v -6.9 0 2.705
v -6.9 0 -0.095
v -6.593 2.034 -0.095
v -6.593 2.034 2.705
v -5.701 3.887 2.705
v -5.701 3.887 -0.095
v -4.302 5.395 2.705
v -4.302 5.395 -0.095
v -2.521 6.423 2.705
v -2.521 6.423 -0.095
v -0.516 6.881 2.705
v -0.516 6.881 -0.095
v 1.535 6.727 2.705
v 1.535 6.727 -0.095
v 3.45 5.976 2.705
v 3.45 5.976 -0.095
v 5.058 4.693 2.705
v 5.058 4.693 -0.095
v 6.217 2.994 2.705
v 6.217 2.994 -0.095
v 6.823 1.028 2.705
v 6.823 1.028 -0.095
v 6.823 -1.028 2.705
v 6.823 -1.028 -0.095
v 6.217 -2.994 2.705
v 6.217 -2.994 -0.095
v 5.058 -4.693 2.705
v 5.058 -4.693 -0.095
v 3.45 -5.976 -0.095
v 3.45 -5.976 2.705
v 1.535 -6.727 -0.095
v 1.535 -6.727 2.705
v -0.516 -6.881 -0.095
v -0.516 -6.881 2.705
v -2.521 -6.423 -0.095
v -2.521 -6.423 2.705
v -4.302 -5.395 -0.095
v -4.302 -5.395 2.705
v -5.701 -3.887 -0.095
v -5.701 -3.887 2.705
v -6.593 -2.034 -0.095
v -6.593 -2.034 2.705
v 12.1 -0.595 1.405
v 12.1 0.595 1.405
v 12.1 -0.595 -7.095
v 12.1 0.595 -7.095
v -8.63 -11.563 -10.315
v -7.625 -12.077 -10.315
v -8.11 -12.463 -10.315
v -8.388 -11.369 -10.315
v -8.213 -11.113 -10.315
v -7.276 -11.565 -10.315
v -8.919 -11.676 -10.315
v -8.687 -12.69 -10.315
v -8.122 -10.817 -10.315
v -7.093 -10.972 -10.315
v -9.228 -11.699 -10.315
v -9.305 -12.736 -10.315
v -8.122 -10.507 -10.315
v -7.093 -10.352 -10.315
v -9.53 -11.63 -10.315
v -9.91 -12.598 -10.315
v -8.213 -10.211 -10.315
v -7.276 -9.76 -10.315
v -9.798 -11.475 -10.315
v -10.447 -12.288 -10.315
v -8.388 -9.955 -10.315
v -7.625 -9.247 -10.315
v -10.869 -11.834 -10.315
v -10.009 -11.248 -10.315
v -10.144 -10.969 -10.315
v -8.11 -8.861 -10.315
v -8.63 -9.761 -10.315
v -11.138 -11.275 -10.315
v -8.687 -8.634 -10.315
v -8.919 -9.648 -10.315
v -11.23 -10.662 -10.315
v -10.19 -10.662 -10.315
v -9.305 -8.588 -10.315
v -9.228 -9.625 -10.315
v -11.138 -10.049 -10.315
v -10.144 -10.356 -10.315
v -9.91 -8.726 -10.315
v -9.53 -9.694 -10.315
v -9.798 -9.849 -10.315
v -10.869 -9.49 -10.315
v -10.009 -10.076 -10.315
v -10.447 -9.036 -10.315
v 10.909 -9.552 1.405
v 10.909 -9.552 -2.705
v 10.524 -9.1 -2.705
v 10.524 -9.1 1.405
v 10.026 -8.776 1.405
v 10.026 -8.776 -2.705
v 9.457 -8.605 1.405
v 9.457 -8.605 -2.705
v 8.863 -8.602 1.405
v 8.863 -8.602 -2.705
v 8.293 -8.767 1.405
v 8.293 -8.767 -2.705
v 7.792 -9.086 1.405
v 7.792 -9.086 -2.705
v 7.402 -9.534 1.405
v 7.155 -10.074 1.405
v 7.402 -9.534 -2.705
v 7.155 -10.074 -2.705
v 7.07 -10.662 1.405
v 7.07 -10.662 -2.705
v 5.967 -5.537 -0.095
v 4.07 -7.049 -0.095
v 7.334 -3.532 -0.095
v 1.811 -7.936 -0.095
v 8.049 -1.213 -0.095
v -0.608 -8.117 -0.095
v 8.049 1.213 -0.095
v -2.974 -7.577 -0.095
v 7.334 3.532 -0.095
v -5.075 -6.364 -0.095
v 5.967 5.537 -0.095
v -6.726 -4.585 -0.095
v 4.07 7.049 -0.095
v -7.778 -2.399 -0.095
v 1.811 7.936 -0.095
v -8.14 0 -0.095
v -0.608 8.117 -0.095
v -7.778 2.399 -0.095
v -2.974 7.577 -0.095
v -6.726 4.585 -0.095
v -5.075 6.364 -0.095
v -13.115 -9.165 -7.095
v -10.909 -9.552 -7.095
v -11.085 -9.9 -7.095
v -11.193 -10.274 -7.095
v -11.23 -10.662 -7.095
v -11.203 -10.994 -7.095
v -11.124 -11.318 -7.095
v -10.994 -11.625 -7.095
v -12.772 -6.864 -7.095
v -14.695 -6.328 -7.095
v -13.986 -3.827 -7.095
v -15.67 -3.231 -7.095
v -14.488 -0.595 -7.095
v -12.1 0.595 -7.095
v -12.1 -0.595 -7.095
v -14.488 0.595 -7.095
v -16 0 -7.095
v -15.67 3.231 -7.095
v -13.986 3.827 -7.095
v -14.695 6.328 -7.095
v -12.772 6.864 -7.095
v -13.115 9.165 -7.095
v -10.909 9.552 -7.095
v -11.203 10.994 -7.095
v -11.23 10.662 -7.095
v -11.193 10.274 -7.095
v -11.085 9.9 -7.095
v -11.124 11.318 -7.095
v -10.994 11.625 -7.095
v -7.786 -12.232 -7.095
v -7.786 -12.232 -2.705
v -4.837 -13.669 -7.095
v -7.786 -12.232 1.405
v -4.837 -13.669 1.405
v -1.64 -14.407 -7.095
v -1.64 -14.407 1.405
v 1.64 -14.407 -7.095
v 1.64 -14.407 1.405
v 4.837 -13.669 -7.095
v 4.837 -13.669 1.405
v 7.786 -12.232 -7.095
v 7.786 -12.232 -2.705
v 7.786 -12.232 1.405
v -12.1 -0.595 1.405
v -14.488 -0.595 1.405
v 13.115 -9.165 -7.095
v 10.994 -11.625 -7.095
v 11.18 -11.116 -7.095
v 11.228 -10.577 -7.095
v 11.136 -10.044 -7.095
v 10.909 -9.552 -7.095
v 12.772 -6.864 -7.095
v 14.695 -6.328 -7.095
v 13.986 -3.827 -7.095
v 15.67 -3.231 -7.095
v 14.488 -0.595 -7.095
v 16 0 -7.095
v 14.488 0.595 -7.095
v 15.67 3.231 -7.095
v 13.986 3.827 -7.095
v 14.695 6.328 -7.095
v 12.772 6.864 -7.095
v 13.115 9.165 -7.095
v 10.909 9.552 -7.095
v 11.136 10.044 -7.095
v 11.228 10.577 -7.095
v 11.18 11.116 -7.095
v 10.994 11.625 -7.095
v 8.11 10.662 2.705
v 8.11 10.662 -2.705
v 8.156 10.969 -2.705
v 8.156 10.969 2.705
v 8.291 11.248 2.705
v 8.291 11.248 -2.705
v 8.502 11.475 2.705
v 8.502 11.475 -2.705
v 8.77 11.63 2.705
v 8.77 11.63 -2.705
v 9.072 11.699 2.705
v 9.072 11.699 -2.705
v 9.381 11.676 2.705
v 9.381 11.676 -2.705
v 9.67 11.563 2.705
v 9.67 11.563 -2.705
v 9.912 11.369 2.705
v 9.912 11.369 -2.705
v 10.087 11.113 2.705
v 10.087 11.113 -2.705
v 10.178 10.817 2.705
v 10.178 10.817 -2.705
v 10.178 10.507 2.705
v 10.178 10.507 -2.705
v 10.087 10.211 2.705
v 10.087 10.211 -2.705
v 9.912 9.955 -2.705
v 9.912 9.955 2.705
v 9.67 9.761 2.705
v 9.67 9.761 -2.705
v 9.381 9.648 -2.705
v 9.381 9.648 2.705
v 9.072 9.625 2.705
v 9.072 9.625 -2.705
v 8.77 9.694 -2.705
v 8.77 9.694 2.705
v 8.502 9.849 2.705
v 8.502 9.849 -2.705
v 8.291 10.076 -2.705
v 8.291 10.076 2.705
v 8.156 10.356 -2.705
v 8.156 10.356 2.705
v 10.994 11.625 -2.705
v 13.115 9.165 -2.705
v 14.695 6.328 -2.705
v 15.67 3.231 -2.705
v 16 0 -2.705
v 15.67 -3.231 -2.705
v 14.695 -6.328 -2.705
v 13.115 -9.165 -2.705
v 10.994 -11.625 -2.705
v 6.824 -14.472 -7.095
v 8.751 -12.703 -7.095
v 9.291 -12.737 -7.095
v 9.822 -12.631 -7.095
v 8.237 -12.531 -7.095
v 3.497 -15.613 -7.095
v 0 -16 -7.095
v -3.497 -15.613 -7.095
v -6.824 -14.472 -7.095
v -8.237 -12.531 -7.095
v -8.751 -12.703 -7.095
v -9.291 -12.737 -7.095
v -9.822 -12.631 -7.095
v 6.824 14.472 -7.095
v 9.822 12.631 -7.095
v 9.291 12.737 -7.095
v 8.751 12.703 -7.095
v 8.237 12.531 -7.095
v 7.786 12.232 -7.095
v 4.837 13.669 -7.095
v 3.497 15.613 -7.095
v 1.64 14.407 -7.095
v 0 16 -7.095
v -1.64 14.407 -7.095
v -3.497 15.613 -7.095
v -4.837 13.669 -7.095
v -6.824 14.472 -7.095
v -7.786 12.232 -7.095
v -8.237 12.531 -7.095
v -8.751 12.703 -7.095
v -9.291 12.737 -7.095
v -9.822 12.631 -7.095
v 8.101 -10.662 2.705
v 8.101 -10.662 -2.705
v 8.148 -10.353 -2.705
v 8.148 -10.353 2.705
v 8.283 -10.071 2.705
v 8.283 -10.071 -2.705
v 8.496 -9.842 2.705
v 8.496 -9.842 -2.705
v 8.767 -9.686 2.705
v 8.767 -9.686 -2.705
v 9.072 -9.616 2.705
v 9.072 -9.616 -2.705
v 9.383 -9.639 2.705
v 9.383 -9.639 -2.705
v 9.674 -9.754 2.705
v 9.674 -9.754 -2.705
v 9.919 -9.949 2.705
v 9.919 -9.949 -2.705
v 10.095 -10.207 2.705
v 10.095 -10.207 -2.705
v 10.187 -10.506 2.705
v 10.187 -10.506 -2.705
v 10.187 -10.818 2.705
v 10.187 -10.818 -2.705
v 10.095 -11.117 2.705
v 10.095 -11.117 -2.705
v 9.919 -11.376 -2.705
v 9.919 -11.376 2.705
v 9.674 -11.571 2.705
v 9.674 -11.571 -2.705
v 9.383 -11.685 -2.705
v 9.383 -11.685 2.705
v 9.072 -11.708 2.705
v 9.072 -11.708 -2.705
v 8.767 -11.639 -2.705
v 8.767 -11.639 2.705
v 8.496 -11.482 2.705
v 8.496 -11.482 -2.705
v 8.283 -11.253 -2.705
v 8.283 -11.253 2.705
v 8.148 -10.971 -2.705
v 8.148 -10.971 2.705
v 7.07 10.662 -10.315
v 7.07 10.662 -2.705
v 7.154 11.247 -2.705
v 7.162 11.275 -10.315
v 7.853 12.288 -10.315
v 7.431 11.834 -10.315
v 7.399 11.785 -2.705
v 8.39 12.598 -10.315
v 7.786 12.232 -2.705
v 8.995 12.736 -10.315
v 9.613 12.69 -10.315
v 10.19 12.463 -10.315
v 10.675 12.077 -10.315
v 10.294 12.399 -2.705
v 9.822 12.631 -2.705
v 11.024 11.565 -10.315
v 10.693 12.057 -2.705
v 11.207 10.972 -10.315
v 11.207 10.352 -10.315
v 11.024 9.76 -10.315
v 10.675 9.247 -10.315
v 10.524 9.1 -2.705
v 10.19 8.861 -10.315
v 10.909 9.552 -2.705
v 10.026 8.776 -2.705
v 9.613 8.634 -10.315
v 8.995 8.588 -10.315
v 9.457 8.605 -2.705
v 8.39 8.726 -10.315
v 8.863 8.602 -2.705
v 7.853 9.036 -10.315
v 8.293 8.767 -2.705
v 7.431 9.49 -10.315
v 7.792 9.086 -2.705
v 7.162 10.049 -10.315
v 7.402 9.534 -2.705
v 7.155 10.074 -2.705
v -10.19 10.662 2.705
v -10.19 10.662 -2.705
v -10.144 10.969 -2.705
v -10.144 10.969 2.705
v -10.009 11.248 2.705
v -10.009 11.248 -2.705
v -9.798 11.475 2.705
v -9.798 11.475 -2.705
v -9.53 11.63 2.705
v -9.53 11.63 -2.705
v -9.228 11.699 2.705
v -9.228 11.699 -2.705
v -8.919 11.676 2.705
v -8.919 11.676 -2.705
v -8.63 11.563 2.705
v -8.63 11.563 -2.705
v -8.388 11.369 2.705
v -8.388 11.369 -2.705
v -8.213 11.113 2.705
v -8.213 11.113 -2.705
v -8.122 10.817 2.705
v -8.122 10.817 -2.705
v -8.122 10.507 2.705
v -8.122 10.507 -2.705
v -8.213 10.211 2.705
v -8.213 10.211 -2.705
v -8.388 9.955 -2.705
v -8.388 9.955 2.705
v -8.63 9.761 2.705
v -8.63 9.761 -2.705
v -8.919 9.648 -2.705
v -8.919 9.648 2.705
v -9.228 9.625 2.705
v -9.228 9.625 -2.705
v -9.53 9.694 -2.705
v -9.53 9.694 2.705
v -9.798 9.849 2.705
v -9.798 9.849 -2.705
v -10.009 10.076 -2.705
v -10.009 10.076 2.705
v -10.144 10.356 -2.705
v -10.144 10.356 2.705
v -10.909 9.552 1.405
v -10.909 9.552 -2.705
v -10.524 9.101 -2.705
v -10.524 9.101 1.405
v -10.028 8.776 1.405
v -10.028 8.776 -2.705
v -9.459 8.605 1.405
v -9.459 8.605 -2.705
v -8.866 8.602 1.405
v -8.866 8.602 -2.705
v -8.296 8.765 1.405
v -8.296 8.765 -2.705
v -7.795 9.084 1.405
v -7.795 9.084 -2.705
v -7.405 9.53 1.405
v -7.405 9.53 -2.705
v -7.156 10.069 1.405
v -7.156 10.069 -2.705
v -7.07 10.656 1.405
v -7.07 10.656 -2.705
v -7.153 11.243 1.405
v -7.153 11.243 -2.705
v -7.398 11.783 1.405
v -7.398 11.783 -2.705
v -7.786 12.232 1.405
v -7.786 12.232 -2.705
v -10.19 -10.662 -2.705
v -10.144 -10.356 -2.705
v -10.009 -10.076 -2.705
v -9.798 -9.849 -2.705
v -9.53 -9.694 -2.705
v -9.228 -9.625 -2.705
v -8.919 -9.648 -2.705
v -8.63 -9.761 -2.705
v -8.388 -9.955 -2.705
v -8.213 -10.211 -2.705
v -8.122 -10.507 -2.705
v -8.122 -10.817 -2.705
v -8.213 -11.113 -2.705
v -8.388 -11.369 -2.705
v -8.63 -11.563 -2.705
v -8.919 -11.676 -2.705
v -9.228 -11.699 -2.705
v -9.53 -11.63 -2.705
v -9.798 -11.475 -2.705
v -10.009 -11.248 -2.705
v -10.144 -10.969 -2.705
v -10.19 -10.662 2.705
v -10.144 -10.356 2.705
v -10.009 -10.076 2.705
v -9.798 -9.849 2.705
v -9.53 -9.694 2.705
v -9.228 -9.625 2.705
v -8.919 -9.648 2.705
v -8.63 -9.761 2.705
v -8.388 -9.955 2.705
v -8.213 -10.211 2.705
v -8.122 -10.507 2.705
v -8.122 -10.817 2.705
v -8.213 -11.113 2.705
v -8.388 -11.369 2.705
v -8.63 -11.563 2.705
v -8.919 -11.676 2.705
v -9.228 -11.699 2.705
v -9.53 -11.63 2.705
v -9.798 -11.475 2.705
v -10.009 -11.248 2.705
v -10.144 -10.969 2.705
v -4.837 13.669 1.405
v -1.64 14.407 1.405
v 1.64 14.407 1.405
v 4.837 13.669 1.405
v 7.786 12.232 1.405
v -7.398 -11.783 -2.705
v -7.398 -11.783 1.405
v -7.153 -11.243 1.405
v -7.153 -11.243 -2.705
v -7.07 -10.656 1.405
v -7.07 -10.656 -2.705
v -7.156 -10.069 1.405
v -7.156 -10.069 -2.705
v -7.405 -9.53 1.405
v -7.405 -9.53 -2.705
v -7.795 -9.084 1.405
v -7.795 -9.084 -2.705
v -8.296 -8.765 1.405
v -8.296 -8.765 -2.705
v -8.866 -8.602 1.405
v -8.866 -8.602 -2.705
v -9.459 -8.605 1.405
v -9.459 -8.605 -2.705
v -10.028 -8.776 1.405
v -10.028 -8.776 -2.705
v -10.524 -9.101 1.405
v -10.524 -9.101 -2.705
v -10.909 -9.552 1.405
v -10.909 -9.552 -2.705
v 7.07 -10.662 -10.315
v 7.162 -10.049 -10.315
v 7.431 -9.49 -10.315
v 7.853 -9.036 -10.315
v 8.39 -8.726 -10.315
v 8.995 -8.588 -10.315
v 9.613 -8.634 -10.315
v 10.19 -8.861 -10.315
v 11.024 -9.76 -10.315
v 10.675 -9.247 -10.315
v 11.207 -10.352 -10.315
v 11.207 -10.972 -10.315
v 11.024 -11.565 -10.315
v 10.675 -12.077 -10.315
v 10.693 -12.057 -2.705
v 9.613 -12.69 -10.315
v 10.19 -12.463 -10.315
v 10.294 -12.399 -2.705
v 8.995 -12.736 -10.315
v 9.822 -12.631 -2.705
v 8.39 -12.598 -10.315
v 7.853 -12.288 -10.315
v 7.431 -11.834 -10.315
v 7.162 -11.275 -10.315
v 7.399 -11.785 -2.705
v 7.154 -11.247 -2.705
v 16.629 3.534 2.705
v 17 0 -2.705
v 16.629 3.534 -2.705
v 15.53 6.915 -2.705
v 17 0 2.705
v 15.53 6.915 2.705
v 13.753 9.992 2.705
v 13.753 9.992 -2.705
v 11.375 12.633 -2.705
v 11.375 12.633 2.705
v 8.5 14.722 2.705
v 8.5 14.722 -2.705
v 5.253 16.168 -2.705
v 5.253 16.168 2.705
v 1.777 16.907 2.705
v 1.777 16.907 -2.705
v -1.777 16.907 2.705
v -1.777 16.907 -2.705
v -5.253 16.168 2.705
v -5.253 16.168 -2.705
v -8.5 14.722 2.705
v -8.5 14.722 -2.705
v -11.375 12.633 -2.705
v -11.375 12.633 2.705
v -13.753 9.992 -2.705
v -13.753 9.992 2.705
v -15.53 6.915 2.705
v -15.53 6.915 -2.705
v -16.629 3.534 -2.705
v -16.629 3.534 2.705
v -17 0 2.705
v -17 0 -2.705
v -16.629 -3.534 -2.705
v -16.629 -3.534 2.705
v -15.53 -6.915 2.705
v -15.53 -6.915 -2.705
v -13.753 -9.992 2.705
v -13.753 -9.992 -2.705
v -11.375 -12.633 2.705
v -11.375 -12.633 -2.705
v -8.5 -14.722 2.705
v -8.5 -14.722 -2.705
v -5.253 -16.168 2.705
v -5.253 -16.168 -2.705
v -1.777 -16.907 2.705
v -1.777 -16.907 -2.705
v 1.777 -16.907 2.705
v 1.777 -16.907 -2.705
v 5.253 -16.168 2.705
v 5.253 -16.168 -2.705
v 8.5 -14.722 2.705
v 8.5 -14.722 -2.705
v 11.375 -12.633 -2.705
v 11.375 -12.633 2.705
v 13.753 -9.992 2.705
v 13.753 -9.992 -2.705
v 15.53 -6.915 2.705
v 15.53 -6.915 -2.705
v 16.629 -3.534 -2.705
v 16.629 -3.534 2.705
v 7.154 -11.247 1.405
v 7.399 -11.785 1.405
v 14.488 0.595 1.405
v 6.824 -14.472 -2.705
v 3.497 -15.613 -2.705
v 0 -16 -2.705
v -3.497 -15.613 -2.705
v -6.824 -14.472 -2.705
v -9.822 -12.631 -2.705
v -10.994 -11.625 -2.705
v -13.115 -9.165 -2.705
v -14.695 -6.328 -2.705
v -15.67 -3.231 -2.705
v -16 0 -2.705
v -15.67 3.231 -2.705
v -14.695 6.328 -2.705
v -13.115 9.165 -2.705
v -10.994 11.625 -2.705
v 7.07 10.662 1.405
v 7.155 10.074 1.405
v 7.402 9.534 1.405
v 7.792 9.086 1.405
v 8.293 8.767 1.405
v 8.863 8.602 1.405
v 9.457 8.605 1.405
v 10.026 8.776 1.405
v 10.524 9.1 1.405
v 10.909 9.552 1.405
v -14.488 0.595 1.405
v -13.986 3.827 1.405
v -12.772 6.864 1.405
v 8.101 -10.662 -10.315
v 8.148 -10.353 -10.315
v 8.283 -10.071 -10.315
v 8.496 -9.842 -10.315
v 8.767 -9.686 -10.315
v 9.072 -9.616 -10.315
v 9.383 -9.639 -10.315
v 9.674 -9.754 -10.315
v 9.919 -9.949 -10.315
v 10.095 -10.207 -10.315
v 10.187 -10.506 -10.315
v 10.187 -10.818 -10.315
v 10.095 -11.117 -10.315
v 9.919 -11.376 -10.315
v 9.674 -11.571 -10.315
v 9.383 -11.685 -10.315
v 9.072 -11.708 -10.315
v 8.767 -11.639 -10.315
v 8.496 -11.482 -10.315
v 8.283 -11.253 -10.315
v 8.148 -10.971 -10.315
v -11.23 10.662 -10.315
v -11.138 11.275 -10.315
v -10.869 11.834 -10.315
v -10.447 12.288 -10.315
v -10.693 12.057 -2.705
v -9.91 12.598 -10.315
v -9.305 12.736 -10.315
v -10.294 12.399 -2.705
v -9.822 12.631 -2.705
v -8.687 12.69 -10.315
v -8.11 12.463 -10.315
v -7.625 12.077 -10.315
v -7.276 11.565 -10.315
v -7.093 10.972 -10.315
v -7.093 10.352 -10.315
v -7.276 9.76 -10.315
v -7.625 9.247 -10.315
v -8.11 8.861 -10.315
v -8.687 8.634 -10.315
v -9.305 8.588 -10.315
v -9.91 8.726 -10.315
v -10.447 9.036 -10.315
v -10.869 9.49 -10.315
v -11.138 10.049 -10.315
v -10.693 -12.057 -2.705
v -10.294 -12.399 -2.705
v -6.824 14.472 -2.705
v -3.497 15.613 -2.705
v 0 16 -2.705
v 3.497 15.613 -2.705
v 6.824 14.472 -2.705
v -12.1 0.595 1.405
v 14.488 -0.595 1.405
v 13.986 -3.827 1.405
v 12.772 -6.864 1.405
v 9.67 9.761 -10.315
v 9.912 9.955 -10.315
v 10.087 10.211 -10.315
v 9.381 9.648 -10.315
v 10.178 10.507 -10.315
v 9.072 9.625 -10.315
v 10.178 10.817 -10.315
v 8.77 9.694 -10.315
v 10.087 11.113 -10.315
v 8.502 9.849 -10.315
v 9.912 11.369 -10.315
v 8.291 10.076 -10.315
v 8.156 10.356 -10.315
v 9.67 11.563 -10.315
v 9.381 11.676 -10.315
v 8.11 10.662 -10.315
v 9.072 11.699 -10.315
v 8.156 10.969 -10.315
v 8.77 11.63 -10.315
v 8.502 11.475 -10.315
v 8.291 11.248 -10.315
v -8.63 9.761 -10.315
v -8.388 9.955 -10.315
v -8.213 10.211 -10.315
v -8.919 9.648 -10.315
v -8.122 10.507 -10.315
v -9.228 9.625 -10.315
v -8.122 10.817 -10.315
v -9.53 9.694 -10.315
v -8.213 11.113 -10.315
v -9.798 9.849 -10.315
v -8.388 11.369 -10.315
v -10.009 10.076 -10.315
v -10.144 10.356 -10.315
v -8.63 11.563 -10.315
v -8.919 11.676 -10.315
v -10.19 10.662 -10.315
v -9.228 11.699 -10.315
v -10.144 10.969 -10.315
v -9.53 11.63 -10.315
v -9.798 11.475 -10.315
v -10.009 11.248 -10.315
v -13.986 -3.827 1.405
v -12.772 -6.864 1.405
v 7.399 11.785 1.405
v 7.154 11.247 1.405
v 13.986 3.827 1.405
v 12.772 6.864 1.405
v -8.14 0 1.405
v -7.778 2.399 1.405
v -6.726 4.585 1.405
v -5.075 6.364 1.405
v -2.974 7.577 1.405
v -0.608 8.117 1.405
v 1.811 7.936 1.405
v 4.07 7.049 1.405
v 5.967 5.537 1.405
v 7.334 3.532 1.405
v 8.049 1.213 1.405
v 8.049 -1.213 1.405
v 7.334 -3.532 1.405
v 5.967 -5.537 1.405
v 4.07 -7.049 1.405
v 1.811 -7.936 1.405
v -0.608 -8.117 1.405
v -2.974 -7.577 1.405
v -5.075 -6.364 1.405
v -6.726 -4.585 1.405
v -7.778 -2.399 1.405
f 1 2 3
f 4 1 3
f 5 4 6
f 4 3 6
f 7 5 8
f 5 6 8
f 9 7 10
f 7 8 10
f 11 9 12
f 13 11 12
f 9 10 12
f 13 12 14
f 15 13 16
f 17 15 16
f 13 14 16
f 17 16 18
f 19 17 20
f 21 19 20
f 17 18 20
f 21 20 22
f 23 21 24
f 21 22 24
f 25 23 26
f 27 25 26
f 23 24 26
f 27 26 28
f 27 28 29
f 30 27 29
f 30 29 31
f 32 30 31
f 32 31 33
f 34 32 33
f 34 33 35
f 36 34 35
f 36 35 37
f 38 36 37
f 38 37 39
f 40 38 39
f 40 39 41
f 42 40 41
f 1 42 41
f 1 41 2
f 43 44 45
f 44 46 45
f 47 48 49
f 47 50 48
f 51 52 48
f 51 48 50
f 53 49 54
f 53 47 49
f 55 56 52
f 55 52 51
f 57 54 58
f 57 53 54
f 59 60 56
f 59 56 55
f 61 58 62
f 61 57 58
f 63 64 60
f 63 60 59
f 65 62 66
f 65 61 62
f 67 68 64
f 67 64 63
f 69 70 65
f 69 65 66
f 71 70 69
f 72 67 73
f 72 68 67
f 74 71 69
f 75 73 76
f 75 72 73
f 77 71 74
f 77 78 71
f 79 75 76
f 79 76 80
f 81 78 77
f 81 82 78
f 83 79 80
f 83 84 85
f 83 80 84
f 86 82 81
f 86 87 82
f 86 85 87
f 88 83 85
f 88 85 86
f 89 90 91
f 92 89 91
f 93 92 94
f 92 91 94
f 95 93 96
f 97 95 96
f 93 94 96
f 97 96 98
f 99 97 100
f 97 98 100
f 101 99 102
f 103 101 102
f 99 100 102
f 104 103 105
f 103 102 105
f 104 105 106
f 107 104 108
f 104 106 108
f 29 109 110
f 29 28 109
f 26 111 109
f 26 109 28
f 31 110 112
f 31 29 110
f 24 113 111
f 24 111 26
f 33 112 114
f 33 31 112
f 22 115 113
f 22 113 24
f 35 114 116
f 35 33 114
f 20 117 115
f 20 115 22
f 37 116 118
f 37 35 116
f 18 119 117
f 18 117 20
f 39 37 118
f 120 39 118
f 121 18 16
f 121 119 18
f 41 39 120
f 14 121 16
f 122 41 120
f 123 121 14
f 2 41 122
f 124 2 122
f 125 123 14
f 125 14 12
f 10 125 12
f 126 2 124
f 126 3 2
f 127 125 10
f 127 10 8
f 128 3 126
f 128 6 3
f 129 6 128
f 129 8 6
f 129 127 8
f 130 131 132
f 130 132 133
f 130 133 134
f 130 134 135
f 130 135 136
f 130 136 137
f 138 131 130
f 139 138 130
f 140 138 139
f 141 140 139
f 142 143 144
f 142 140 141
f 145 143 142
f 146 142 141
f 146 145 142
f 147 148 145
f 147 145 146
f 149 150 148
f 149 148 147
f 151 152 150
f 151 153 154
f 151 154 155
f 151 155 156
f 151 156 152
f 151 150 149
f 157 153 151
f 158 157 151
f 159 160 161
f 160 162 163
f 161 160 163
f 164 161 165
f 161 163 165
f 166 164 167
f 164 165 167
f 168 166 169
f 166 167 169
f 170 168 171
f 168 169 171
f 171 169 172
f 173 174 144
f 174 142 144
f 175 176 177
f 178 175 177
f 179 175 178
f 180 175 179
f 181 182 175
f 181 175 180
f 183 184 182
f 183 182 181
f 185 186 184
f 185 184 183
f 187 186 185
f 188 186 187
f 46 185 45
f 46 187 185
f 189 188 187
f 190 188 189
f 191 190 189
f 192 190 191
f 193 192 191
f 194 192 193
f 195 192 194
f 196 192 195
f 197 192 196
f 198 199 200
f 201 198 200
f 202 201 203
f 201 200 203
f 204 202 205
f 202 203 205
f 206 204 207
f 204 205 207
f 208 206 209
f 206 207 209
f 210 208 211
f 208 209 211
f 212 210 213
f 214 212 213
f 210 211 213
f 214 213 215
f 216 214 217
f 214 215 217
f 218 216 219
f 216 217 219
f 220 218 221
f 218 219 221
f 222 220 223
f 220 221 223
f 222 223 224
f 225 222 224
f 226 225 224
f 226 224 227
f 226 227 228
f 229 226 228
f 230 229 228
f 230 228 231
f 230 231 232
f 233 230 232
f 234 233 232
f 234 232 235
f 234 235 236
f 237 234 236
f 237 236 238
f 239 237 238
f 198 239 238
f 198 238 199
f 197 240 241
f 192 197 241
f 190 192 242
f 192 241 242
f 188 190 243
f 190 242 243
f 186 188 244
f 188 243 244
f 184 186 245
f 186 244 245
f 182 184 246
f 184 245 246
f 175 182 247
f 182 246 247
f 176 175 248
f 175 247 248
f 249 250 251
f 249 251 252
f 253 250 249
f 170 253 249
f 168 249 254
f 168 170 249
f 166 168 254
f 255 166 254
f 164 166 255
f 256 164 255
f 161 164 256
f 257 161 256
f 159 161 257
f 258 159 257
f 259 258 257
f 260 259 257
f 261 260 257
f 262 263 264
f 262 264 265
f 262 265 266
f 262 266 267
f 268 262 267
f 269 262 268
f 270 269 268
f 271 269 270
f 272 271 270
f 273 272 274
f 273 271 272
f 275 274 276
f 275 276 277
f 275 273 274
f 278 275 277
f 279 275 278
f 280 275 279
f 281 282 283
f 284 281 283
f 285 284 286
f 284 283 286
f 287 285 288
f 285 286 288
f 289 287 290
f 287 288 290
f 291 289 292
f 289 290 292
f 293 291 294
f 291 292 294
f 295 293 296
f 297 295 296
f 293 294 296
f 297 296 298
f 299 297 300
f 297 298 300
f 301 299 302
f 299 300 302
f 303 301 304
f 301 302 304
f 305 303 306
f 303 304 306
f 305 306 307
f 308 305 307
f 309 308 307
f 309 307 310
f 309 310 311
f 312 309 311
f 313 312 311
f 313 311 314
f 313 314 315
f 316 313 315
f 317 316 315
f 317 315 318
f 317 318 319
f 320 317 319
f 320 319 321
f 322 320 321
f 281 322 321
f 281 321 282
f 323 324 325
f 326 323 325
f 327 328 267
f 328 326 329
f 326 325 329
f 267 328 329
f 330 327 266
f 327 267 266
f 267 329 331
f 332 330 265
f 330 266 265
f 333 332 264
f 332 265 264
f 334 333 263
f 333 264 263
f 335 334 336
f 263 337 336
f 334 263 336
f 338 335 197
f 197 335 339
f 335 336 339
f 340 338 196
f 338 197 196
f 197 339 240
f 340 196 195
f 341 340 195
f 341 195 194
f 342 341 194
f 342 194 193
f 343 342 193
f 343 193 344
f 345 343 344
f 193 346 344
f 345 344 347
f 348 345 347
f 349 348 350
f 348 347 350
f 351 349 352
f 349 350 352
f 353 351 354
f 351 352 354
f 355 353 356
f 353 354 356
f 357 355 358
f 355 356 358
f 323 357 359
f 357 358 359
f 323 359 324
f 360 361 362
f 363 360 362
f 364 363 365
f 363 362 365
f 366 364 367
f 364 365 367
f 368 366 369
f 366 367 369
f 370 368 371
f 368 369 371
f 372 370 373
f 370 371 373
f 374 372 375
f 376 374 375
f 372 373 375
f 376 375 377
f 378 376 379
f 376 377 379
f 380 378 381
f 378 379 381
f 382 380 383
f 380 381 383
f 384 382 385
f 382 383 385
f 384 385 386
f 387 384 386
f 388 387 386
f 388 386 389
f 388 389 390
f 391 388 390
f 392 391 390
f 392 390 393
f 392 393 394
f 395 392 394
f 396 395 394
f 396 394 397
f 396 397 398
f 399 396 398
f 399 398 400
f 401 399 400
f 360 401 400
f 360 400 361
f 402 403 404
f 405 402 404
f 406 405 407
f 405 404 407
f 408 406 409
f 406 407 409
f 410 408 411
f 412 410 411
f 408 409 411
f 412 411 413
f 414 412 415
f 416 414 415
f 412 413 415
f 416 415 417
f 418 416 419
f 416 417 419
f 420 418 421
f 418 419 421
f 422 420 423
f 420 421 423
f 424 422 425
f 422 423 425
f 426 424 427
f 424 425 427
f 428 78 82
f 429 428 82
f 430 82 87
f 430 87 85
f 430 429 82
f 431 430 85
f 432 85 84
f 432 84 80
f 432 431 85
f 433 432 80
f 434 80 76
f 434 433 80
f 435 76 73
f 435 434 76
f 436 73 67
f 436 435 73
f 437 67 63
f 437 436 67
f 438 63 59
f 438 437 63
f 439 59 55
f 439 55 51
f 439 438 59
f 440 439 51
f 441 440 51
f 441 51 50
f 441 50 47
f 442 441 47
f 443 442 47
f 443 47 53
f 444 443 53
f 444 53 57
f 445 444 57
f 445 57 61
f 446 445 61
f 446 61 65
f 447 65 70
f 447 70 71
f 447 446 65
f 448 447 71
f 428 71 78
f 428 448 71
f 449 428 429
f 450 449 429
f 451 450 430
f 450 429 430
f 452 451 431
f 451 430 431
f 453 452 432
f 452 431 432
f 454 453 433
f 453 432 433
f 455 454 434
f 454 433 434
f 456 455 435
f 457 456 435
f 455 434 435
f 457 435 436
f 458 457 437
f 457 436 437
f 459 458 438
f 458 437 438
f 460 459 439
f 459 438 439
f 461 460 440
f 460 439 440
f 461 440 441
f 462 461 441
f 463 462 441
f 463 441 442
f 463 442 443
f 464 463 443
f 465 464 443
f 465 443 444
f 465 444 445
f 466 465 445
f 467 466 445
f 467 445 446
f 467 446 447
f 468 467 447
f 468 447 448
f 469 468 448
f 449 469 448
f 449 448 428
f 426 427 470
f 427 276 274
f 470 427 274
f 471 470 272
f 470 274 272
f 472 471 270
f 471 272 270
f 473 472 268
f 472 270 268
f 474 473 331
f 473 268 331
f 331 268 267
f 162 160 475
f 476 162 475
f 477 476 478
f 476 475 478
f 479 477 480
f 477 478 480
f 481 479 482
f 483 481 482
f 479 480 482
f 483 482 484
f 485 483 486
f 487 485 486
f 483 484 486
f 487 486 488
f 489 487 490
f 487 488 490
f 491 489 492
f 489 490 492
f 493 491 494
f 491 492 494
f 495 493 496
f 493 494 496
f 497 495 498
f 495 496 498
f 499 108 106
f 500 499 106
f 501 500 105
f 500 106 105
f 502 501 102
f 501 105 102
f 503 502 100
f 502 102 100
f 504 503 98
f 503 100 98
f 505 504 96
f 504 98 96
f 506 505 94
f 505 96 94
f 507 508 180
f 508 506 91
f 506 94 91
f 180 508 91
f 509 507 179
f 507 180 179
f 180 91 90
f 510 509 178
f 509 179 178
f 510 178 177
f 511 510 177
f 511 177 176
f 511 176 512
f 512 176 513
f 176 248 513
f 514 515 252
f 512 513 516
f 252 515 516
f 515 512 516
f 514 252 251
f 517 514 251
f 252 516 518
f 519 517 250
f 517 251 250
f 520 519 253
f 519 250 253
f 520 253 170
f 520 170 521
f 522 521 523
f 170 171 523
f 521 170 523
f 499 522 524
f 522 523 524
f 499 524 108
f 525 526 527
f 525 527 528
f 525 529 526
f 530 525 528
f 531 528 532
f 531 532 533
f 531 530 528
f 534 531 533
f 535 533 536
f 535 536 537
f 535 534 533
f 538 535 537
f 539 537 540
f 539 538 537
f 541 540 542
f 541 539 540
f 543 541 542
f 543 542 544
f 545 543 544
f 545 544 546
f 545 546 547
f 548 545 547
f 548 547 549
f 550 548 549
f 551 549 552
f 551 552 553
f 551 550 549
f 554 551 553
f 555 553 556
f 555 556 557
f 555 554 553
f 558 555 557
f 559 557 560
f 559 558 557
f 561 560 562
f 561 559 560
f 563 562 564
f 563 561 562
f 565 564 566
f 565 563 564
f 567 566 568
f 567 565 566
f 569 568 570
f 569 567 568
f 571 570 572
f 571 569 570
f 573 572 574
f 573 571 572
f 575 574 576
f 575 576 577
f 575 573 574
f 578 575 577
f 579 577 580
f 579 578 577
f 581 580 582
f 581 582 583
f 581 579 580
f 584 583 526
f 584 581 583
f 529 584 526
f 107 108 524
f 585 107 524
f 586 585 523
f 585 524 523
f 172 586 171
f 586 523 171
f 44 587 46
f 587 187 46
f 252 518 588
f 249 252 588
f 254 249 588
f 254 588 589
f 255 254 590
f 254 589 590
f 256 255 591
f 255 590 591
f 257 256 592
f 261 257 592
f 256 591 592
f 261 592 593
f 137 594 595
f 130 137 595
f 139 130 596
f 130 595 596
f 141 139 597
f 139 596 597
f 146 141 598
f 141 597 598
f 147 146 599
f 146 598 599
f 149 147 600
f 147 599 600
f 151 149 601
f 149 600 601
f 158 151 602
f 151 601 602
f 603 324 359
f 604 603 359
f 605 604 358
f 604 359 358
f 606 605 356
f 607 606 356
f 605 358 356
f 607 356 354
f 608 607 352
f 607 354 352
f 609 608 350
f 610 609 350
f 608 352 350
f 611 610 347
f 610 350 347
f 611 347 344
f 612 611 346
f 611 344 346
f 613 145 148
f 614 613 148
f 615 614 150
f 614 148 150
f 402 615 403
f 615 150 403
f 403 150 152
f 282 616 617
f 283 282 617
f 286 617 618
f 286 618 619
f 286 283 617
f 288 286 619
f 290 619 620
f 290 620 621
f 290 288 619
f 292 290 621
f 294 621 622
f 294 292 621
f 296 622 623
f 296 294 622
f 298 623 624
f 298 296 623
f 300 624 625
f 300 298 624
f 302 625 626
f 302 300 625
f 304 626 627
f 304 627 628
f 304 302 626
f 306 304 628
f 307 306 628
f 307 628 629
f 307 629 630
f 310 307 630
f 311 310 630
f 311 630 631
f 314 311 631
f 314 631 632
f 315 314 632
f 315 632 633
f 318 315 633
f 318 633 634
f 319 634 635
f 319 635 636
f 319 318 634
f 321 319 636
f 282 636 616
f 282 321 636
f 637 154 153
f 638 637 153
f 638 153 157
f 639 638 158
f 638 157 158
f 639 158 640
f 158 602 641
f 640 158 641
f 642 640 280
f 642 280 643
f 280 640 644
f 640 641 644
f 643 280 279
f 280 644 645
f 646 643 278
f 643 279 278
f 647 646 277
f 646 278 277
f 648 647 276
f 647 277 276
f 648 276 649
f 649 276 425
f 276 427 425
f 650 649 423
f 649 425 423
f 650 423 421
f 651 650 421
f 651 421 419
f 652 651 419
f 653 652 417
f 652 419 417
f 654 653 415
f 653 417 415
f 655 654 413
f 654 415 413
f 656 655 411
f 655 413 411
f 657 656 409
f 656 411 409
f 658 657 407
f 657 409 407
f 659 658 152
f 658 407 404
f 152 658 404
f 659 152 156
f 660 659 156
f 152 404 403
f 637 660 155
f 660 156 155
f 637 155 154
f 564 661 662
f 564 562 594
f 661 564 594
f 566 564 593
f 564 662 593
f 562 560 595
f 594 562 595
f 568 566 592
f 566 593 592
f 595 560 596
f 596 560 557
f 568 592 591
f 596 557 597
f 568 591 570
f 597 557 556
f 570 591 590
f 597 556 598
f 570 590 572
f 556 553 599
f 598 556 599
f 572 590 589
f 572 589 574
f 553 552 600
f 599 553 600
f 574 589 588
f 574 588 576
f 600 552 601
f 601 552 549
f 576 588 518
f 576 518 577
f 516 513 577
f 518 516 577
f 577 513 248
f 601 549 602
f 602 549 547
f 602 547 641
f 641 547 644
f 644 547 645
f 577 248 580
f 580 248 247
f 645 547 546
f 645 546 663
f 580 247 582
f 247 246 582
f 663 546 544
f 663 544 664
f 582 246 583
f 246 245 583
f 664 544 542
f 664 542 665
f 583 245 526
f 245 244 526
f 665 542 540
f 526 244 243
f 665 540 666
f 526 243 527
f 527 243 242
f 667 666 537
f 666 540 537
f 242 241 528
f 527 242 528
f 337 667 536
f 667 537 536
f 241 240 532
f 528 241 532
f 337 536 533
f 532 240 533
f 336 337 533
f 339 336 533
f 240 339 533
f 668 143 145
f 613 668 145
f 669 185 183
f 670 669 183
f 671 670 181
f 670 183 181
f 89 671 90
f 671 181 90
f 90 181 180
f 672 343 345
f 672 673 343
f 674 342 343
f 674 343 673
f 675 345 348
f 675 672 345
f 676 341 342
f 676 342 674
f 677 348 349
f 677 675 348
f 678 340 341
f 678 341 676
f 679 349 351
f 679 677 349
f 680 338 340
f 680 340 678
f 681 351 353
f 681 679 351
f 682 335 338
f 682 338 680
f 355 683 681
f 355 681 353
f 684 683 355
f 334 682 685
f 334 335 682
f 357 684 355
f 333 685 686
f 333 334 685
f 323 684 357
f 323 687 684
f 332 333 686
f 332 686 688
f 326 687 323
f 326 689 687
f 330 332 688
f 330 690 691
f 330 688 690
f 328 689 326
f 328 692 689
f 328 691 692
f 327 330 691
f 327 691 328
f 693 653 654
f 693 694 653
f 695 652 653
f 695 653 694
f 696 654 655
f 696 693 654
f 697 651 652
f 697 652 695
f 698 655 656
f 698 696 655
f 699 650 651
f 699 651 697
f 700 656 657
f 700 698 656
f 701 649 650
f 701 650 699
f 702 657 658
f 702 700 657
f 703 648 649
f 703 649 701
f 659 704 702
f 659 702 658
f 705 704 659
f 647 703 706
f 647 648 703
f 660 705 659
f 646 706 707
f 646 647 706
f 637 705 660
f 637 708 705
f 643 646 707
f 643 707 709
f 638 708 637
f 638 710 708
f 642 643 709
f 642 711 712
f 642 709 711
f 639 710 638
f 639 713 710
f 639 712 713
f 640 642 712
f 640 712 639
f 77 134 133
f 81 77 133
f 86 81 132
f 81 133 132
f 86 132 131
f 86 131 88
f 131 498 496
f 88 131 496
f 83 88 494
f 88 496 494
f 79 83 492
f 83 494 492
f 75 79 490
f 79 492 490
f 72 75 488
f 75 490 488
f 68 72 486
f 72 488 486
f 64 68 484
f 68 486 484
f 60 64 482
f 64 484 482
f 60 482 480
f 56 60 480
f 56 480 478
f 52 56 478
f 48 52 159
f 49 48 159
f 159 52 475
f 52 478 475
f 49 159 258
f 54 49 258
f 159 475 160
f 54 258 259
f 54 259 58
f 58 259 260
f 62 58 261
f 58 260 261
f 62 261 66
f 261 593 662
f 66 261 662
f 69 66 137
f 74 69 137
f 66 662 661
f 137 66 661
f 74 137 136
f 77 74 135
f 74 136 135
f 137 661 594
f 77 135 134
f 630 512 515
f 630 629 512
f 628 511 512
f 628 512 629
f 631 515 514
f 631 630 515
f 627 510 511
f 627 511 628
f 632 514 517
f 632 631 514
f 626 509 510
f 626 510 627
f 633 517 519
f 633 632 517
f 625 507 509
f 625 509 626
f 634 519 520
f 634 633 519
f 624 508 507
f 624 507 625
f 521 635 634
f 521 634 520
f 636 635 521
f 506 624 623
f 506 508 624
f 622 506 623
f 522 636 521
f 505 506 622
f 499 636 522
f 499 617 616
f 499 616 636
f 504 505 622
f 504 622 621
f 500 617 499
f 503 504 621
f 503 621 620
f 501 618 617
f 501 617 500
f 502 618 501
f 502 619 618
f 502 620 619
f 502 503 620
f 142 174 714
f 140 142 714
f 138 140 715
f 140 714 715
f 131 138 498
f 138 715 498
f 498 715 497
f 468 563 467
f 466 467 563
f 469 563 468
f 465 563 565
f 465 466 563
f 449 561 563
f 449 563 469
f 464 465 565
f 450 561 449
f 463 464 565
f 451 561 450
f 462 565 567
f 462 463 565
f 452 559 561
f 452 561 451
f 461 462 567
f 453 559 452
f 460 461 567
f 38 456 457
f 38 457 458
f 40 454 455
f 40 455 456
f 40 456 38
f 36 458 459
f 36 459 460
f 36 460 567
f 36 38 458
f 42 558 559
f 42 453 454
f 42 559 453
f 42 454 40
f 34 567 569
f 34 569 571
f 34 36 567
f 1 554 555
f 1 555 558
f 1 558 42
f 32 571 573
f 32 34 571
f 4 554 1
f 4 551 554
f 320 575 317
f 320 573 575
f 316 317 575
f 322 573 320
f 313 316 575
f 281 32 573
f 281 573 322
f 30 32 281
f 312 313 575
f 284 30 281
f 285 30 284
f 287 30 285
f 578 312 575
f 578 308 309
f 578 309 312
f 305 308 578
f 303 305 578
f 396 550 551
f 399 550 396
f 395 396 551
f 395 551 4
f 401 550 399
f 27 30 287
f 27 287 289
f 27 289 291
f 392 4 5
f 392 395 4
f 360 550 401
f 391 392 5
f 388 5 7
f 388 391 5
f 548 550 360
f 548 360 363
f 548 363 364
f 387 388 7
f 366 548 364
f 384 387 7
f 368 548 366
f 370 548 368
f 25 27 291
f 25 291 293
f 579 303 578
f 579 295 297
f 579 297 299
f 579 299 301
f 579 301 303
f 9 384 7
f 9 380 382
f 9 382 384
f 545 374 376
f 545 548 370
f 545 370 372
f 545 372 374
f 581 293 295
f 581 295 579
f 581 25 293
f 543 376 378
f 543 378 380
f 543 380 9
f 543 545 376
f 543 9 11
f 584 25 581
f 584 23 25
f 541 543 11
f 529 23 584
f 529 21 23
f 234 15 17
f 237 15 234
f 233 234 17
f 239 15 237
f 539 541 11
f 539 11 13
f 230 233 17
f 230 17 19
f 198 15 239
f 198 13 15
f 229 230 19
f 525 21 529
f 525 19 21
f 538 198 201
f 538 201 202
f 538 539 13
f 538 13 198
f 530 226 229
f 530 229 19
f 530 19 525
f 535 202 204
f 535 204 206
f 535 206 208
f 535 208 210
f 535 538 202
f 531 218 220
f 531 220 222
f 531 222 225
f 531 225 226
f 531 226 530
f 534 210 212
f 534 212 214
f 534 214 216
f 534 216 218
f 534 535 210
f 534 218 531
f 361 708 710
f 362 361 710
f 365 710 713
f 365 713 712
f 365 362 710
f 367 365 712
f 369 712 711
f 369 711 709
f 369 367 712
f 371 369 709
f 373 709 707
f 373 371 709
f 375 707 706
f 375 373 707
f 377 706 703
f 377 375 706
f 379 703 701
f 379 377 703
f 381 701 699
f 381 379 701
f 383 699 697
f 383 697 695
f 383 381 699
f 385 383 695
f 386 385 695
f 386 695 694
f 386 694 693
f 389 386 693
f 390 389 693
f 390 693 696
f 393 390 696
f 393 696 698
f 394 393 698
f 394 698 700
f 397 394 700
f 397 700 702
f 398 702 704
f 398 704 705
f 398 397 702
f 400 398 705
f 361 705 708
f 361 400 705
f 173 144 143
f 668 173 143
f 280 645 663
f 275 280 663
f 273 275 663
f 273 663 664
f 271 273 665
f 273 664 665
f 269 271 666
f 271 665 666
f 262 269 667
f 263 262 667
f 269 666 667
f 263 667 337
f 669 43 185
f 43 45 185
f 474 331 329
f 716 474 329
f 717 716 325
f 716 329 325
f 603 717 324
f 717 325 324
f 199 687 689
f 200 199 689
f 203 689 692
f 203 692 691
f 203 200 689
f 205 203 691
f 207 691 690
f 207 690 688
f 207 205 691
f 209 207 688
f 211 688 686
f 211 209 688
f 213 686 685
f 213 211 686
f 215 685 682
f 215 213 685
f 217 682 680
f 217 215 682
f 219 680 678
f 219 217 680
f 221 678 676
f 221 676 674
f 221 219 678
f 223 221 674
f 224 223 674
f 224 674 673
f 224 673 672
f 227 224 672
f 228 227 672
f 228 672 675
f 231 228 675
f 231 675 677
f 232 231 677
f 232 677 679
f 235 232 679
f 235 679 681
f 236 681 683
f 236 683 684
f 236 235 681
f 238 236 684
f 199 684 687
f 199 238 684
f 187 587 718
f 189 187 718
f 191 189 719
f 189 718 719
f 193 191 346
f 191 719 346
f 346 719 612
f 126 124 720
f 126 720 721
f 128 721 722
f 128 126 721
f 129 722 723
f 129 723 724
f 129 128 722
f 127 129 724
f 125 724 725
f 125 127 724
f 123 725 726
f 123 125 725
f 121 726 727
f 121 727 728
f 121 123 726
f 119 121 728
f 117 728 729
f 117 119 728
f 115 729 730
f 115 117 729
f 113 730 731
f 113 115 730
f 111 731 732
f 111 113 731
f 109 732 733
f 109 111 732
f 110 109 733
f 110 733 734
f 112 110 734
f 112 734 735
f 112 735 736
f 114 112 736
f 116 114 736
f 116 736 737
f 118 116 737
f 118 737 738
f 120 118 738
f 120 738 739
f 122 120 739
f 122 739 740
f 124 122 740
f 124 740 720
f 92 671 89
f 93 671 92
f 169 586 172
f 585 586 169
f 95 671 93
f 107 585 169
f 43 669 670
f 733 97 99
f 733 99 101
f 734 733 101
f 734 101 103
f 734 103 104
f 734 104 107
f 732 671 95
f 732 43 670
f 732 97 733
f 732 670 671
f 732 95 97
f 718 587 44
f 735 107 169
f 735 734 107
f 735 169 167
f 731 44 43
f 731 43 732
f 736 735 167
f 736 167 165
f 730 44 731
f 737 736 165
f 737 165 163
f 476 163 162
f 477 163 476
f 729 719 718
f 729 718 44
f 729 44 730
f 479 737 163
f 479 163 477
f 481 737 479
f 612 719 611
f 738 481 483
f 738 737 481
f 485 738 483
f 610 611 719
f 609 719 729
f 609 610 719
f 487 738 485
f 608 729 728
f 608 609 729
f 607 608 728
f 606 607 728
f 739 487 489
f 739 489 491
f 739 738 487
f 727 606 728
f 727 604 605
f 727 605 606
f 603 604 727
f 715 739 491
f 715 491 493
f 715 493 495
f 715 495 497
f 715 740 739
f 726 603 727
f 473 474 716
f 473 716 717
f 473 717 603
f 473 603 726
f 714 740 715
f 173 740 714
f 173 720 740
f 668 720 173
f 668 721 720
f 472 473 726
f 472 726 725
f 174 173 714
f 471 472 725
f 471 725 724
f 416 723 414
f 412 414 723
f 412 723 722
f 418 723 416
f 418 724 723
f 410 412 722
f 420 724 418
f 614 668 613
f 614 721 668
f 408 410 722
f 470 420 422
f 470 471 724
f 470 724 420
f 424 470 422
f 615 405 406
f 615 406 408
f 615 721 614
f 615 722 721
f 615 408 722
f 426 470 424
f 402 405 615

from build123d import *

# Parameters (mm, degrees)
SKETCH1_R               = 17
BOSS_EXTRUDE2_DEPTH     = 2.705
BOSS_EXTRUDE3_DEPTH     = 4.39
SKETCH6_3_R             = 6.9
CUT_EXTRUDE2_DEPTH      = 5.39
CUT_EXTRUDE2_DEPTH_BACK = 6.41
SKETCH6_6_R             = 8.14
CUT_EXTRUDE3_DEPTH      = 4.11
SKETCH6_7_R             = 8.14
SKETCH6_7_R_2           = 6.9
CUT_EXTRUDE4_DEPTH      = 2.61
SKETCH6_12_R            = 1.04
SKETCH6_12_R_2          = 1.048997708
CUT_EXTRUDE5_DEPTH      = 6.41
SKETCH6_13_R            = 2.08
SKETCH6_13_R_2          = 1.04
SKETCH6_13_R_3          = 1.048997708
BOSS_EXTRUDE4_DEPTH     = 7.61


with BuildPart() as part:
    # Sketch1 → Boss-Extrude2 (new body, symmetric)
    with BuildSketch(Plane.XY):
        Circle(SKETCH1_R)
    extrude(amount=BOSS_EXTRUDE2_DEPTH, both=True)

    # Sketch6 → Boss-Extrude3 (add)
    with BuildSketch(Plane(origin=(0, 0, -2.705), x_dir=(-1, 0, 0), z_dir=(0, 0, -1))):
        with BuildLine():
            ThreePointArc((-7.785906142, 12.23232053), (0, 14.5), (7.785906142, 12.23232053))
            ThreePointArc((7.785906142, 12.23232053), (8.750658086, 12.703387332), (9.821803695, 12.630604585))
            ThreePointArc((9.821803695, 12.630604585), (0, 16), (-9.821803695, 12.630604585))
            ThreePointArc((-9.821803695, 12.630604585), (-8.750658086, 12.703387332), (-7.785906142, 12.23232053))
        make_face()
        with BuildLine():
            ThreePointArc((10.909063856, 9.552084892), (13.46504185, 5.379837169), (14.487787098, 0.595))
            ThreePointArc((14.487787098, 0.595), (14.5, 0), (14.487787098, -0.595))
            ThreePointArc((14.487787098, -0.595), (13.46504185, -5.379837169), (10.909063856, -9.552084892))
            ThreePointArc((10.909063856, -9.552084892), (11.148155752, -10.084350931), (11.23, -10.662082348))
            ThreePointArc((11.23, -10.662082348), (11.170079442, -11.157742564), (10.993770145, -11.624844859))
            ThreePointArc((10.993770145, -11.624844859), (16, 0), (10.993770145, 11.624844859))
            ThreePointArc((10.993770145, 11.624844859), (11.170079442, 11.157742564), (11.23, 10.662082348))
            ThreePointArc((11.23, 10.662082348), (11.148155752, 10.084350931), (10.909063856, 9.552084892))
        make_face()
        with BuildLine():
            ThreePointArc((9.821803695, -12.630604585), (8.750658086, -12.703387332), (7.785906142, -12.23232053))
            ThreePointArc((7.785906142, -12.23232053), (0, -14.5), (-7.785906142, -12.23232053))
            ThreePointArc((-7.785906142, -12.23232053), (-8.750658086, -12.703387332), (-9.821803695, -12.630604585))
            ThreePointArc((-9.821803695, -12.630604585), (0, -16), (9.821803695, -12.630604585))
        make_face()
        with BuildLine():
            ThreePointArc((-14.487787098, 0.595), (-13.46504185, 5.379837169), (-10.909063856, 9.552084892))
            ThreePointArc((-10.909063856, 9.552084892), (-11.228265305, 10.577151075), (-10.993770145, 11.624844859))
            ThreePointArc((-10.993770145, 11.624844859), (-16, 0), (-10.993770145, -11.624844859))
            ThreePointArc((-10.993770145, -11.624844859), (-11.228265305, -10.577151075), (-10.909063856, -9.552084892))
            ThreePointArc((-10.909063856, -9.552084892), (-13.46504185, -5.379837169), (-14.487787098, -0.595))
            ThreePointArc((-14.487787098, -0.595), (-14.5, 0), (-14.487787098, 0.595))
        make_face()
        with BuildLine():
            Line((-12.1, 0.595), (-14.487787098, 0.595))
            ThreePointArc((-14.487787098, 0.595), (-14.5, 0), (-14.487787098, -0.595))
            Line((-14.487787098, -0.595), (-12.1, -0.595))
            Line((-12.1, -0.595), (-12.1, 0.595))
        make_face()
        with BuildLine():
            ThreePointArc((14.487787098, -0.595), (14.5, 0), (14.487787098, 0.595))
            Line((14.487787098, 0.595), (12.1, 0.595))
            Line((12.1, 0.595), (12.1, -0.595))
            Line((12.1, -0.595), (14.487787098, -0.595))
        make_face()
    extrude(amount=BOSS_EXTRUDE3_DEPTH)

    # Sketch6<3> → Cut-Extrude2 (cut, two sides)
    with BuildSketch(Plane(origin=(0, 0, -2.705), x_dir=(-1, 0, 0), z_dir=(0, 0, -1))) as cut_extrude2_sk:
        Circle(SKETCH6_3_R)
    extrude(amount=CUT_EXTRUDE2_DEPTH, mode=Mode.SUBTRACT)
    extrude(cut_extrude2_sk.sketch, amount=-CUT_EXTRUDE2_DEPTH_BACK, mode=Mode.SUBTRACT)

    # Sketch6<6> → Cut-Extrude3 (cut)
    with BuildSketch(Plane(origin=(0, 0, -2.705), x_dir=(-1, 0, 0), z_dir=(0, 0, -1))):
        with BuildLine():
            Line((12.1, 0.595), (14.487787098, 0.595))
            ThreePointArc((14.487787098, 0.595), (13.46504185, 5.379837169), (10.909063856, 9.552084892))
            ThreePointArc((10.909063856, 9.552084892), (7.795409253, 9.08363884), (7.785906142, 12.23232053))
            ThreePointArc((7.785906142, 12.23232053), (0, 14.5), (-7.785906142, 12.23232053))
            ThreePointArc((-7.785906142, 12.23232053), (-7.257420382, 11.524951045), (-7.07, 10.662082348))
            ThreePointArc((-7.07, 10.662082348), (-8.572268583, 8.663926596), (-10.909063856, 9.552084892))
            ThreePointArc((-10.909063856, 9.552084892), (-13.46504185, 5.379837169), (-14.487787098, 0.595))
            Line((-14.487787098, 0.595), (-12.1, 0.595))
            Line((-12.1, 0.595), (-12.1, -0.595))
            Line((-12.1, -0.595), (-14.487787098, -0.595))
            ThreePointArc((-14.487787098, -0.595), (-13.46504185, -5.379837169), (-10.909063856, -9.552084892))
            ThreePointArc((-10.909063856, -9.552084892), (-8.572268583, -8.663926596), (-7.07, -10.662082348))
            ThreePointArc((-7.07, -10.662082348), (-7.257420382, -11.524951045), (-7.785906142, -12.23232053))
            ThreePointArc((-7.785906142, -12.23232053), (0, -14.5), (7.785906142, -12.23232053))
            ThreePointArc((7.785906142, -12.23232053), (7.795409253, -9.08363884), (10.909063856, -9.552084892))
            ThreePointArc((10.909063856, -9.552084892), (13.46504185, -5.379837169), (14.487787098, -0.595))
            Line((14.487787098, -0.595), (12.1, -0.595))
            Line((12.1, -0.595), (12.1, 0.595))
        make_face()
        Circle(SKETCH6_6_R, mode=Mode.SUBTRACT)
    extrude(amount=-CUT_EXTRUDE3_DEPTH, mode=Mode.SUBTRACT)

    # Sketch6<7> → Cut-Extrude4 (cut)
    with BuildSketch(Plane(origin=(0, 0, -2.705), x_dir=(-1, 0, 0), z_dir=(0, 0, -1))):
        Circle(SKETCH6_7_R)
        Circle(SKETCH6_7_R_2, mode=Mode.SUBTRACT)
    extrude(amount=-CUT_EXTRUDE4_DEPTH, mode=Mode.SUBTRACT)

    # Sketch6<12> → Cut-Extrude5 (cut, through all)
    with BuildSketch(Plane(origin=(0, 0, -2.705), x_dir=(-1, 0, 0), z_dir=(0, 0, -1))):
        with Locations((9.15, -10.662082348)):
            Circle(SKETCH6_12_R)
        with Locations((-9.15, -10.662082348)):
            Circle(SKETCH6_12_R_2)
        with Locations((9.15, 10.662082348)):
            Circle(SKETCH6_12_R)
        with Locations((-9.15, 10.662082348)):
            Circle(SKETCH6_12_R)
    extrude(amount=-CUT_EXTRUDE5_DEPTH, mode=Mode.SUBTRACT)

    # Sketch6<13> → Boss-Extrude4 (add)
    with BuildSketch(Plane(origin=(0, 0, -2.705), x_dir=(-1, 0, 0), z_dir=(0, 0, -1))):
        with Locations((9.15, 10.662082348)):
            Circle(SKETCH6_13_R)
        with Locations((9.15, 10.662082348)):
            Circle(SKETCH6_13_R_2, mode=Mode.SUBTRACT)
        with Locations((9.15, -10.662082348)):
            Circle(SKETCH6_13_R)
        with Locations((9.15, -10.662082348)):
            Circle(SKETCH6_13_R_2, mode=Mode.SUBTRACT)
        with Locations((-9.15, 10.662082348)):
            Circle(SKETCH6_13_R)
        with Locations((-9.15, 10.662082348)):
            Circle(SKETCH6_13_R_2, mode=Mode.SUBTRACT)
        with Locations((-9.15, -10.662082348)):
            Circle(SKETCH6_13_R)
        with Locations((-9.15, -10.662082348)):
            Circle(SKETCH6_13_R_3, mode=Mode.SUBTRACT)
    extrude(amount=BOSS_EXTRUDE4_DEPTH)


solid = part.part
